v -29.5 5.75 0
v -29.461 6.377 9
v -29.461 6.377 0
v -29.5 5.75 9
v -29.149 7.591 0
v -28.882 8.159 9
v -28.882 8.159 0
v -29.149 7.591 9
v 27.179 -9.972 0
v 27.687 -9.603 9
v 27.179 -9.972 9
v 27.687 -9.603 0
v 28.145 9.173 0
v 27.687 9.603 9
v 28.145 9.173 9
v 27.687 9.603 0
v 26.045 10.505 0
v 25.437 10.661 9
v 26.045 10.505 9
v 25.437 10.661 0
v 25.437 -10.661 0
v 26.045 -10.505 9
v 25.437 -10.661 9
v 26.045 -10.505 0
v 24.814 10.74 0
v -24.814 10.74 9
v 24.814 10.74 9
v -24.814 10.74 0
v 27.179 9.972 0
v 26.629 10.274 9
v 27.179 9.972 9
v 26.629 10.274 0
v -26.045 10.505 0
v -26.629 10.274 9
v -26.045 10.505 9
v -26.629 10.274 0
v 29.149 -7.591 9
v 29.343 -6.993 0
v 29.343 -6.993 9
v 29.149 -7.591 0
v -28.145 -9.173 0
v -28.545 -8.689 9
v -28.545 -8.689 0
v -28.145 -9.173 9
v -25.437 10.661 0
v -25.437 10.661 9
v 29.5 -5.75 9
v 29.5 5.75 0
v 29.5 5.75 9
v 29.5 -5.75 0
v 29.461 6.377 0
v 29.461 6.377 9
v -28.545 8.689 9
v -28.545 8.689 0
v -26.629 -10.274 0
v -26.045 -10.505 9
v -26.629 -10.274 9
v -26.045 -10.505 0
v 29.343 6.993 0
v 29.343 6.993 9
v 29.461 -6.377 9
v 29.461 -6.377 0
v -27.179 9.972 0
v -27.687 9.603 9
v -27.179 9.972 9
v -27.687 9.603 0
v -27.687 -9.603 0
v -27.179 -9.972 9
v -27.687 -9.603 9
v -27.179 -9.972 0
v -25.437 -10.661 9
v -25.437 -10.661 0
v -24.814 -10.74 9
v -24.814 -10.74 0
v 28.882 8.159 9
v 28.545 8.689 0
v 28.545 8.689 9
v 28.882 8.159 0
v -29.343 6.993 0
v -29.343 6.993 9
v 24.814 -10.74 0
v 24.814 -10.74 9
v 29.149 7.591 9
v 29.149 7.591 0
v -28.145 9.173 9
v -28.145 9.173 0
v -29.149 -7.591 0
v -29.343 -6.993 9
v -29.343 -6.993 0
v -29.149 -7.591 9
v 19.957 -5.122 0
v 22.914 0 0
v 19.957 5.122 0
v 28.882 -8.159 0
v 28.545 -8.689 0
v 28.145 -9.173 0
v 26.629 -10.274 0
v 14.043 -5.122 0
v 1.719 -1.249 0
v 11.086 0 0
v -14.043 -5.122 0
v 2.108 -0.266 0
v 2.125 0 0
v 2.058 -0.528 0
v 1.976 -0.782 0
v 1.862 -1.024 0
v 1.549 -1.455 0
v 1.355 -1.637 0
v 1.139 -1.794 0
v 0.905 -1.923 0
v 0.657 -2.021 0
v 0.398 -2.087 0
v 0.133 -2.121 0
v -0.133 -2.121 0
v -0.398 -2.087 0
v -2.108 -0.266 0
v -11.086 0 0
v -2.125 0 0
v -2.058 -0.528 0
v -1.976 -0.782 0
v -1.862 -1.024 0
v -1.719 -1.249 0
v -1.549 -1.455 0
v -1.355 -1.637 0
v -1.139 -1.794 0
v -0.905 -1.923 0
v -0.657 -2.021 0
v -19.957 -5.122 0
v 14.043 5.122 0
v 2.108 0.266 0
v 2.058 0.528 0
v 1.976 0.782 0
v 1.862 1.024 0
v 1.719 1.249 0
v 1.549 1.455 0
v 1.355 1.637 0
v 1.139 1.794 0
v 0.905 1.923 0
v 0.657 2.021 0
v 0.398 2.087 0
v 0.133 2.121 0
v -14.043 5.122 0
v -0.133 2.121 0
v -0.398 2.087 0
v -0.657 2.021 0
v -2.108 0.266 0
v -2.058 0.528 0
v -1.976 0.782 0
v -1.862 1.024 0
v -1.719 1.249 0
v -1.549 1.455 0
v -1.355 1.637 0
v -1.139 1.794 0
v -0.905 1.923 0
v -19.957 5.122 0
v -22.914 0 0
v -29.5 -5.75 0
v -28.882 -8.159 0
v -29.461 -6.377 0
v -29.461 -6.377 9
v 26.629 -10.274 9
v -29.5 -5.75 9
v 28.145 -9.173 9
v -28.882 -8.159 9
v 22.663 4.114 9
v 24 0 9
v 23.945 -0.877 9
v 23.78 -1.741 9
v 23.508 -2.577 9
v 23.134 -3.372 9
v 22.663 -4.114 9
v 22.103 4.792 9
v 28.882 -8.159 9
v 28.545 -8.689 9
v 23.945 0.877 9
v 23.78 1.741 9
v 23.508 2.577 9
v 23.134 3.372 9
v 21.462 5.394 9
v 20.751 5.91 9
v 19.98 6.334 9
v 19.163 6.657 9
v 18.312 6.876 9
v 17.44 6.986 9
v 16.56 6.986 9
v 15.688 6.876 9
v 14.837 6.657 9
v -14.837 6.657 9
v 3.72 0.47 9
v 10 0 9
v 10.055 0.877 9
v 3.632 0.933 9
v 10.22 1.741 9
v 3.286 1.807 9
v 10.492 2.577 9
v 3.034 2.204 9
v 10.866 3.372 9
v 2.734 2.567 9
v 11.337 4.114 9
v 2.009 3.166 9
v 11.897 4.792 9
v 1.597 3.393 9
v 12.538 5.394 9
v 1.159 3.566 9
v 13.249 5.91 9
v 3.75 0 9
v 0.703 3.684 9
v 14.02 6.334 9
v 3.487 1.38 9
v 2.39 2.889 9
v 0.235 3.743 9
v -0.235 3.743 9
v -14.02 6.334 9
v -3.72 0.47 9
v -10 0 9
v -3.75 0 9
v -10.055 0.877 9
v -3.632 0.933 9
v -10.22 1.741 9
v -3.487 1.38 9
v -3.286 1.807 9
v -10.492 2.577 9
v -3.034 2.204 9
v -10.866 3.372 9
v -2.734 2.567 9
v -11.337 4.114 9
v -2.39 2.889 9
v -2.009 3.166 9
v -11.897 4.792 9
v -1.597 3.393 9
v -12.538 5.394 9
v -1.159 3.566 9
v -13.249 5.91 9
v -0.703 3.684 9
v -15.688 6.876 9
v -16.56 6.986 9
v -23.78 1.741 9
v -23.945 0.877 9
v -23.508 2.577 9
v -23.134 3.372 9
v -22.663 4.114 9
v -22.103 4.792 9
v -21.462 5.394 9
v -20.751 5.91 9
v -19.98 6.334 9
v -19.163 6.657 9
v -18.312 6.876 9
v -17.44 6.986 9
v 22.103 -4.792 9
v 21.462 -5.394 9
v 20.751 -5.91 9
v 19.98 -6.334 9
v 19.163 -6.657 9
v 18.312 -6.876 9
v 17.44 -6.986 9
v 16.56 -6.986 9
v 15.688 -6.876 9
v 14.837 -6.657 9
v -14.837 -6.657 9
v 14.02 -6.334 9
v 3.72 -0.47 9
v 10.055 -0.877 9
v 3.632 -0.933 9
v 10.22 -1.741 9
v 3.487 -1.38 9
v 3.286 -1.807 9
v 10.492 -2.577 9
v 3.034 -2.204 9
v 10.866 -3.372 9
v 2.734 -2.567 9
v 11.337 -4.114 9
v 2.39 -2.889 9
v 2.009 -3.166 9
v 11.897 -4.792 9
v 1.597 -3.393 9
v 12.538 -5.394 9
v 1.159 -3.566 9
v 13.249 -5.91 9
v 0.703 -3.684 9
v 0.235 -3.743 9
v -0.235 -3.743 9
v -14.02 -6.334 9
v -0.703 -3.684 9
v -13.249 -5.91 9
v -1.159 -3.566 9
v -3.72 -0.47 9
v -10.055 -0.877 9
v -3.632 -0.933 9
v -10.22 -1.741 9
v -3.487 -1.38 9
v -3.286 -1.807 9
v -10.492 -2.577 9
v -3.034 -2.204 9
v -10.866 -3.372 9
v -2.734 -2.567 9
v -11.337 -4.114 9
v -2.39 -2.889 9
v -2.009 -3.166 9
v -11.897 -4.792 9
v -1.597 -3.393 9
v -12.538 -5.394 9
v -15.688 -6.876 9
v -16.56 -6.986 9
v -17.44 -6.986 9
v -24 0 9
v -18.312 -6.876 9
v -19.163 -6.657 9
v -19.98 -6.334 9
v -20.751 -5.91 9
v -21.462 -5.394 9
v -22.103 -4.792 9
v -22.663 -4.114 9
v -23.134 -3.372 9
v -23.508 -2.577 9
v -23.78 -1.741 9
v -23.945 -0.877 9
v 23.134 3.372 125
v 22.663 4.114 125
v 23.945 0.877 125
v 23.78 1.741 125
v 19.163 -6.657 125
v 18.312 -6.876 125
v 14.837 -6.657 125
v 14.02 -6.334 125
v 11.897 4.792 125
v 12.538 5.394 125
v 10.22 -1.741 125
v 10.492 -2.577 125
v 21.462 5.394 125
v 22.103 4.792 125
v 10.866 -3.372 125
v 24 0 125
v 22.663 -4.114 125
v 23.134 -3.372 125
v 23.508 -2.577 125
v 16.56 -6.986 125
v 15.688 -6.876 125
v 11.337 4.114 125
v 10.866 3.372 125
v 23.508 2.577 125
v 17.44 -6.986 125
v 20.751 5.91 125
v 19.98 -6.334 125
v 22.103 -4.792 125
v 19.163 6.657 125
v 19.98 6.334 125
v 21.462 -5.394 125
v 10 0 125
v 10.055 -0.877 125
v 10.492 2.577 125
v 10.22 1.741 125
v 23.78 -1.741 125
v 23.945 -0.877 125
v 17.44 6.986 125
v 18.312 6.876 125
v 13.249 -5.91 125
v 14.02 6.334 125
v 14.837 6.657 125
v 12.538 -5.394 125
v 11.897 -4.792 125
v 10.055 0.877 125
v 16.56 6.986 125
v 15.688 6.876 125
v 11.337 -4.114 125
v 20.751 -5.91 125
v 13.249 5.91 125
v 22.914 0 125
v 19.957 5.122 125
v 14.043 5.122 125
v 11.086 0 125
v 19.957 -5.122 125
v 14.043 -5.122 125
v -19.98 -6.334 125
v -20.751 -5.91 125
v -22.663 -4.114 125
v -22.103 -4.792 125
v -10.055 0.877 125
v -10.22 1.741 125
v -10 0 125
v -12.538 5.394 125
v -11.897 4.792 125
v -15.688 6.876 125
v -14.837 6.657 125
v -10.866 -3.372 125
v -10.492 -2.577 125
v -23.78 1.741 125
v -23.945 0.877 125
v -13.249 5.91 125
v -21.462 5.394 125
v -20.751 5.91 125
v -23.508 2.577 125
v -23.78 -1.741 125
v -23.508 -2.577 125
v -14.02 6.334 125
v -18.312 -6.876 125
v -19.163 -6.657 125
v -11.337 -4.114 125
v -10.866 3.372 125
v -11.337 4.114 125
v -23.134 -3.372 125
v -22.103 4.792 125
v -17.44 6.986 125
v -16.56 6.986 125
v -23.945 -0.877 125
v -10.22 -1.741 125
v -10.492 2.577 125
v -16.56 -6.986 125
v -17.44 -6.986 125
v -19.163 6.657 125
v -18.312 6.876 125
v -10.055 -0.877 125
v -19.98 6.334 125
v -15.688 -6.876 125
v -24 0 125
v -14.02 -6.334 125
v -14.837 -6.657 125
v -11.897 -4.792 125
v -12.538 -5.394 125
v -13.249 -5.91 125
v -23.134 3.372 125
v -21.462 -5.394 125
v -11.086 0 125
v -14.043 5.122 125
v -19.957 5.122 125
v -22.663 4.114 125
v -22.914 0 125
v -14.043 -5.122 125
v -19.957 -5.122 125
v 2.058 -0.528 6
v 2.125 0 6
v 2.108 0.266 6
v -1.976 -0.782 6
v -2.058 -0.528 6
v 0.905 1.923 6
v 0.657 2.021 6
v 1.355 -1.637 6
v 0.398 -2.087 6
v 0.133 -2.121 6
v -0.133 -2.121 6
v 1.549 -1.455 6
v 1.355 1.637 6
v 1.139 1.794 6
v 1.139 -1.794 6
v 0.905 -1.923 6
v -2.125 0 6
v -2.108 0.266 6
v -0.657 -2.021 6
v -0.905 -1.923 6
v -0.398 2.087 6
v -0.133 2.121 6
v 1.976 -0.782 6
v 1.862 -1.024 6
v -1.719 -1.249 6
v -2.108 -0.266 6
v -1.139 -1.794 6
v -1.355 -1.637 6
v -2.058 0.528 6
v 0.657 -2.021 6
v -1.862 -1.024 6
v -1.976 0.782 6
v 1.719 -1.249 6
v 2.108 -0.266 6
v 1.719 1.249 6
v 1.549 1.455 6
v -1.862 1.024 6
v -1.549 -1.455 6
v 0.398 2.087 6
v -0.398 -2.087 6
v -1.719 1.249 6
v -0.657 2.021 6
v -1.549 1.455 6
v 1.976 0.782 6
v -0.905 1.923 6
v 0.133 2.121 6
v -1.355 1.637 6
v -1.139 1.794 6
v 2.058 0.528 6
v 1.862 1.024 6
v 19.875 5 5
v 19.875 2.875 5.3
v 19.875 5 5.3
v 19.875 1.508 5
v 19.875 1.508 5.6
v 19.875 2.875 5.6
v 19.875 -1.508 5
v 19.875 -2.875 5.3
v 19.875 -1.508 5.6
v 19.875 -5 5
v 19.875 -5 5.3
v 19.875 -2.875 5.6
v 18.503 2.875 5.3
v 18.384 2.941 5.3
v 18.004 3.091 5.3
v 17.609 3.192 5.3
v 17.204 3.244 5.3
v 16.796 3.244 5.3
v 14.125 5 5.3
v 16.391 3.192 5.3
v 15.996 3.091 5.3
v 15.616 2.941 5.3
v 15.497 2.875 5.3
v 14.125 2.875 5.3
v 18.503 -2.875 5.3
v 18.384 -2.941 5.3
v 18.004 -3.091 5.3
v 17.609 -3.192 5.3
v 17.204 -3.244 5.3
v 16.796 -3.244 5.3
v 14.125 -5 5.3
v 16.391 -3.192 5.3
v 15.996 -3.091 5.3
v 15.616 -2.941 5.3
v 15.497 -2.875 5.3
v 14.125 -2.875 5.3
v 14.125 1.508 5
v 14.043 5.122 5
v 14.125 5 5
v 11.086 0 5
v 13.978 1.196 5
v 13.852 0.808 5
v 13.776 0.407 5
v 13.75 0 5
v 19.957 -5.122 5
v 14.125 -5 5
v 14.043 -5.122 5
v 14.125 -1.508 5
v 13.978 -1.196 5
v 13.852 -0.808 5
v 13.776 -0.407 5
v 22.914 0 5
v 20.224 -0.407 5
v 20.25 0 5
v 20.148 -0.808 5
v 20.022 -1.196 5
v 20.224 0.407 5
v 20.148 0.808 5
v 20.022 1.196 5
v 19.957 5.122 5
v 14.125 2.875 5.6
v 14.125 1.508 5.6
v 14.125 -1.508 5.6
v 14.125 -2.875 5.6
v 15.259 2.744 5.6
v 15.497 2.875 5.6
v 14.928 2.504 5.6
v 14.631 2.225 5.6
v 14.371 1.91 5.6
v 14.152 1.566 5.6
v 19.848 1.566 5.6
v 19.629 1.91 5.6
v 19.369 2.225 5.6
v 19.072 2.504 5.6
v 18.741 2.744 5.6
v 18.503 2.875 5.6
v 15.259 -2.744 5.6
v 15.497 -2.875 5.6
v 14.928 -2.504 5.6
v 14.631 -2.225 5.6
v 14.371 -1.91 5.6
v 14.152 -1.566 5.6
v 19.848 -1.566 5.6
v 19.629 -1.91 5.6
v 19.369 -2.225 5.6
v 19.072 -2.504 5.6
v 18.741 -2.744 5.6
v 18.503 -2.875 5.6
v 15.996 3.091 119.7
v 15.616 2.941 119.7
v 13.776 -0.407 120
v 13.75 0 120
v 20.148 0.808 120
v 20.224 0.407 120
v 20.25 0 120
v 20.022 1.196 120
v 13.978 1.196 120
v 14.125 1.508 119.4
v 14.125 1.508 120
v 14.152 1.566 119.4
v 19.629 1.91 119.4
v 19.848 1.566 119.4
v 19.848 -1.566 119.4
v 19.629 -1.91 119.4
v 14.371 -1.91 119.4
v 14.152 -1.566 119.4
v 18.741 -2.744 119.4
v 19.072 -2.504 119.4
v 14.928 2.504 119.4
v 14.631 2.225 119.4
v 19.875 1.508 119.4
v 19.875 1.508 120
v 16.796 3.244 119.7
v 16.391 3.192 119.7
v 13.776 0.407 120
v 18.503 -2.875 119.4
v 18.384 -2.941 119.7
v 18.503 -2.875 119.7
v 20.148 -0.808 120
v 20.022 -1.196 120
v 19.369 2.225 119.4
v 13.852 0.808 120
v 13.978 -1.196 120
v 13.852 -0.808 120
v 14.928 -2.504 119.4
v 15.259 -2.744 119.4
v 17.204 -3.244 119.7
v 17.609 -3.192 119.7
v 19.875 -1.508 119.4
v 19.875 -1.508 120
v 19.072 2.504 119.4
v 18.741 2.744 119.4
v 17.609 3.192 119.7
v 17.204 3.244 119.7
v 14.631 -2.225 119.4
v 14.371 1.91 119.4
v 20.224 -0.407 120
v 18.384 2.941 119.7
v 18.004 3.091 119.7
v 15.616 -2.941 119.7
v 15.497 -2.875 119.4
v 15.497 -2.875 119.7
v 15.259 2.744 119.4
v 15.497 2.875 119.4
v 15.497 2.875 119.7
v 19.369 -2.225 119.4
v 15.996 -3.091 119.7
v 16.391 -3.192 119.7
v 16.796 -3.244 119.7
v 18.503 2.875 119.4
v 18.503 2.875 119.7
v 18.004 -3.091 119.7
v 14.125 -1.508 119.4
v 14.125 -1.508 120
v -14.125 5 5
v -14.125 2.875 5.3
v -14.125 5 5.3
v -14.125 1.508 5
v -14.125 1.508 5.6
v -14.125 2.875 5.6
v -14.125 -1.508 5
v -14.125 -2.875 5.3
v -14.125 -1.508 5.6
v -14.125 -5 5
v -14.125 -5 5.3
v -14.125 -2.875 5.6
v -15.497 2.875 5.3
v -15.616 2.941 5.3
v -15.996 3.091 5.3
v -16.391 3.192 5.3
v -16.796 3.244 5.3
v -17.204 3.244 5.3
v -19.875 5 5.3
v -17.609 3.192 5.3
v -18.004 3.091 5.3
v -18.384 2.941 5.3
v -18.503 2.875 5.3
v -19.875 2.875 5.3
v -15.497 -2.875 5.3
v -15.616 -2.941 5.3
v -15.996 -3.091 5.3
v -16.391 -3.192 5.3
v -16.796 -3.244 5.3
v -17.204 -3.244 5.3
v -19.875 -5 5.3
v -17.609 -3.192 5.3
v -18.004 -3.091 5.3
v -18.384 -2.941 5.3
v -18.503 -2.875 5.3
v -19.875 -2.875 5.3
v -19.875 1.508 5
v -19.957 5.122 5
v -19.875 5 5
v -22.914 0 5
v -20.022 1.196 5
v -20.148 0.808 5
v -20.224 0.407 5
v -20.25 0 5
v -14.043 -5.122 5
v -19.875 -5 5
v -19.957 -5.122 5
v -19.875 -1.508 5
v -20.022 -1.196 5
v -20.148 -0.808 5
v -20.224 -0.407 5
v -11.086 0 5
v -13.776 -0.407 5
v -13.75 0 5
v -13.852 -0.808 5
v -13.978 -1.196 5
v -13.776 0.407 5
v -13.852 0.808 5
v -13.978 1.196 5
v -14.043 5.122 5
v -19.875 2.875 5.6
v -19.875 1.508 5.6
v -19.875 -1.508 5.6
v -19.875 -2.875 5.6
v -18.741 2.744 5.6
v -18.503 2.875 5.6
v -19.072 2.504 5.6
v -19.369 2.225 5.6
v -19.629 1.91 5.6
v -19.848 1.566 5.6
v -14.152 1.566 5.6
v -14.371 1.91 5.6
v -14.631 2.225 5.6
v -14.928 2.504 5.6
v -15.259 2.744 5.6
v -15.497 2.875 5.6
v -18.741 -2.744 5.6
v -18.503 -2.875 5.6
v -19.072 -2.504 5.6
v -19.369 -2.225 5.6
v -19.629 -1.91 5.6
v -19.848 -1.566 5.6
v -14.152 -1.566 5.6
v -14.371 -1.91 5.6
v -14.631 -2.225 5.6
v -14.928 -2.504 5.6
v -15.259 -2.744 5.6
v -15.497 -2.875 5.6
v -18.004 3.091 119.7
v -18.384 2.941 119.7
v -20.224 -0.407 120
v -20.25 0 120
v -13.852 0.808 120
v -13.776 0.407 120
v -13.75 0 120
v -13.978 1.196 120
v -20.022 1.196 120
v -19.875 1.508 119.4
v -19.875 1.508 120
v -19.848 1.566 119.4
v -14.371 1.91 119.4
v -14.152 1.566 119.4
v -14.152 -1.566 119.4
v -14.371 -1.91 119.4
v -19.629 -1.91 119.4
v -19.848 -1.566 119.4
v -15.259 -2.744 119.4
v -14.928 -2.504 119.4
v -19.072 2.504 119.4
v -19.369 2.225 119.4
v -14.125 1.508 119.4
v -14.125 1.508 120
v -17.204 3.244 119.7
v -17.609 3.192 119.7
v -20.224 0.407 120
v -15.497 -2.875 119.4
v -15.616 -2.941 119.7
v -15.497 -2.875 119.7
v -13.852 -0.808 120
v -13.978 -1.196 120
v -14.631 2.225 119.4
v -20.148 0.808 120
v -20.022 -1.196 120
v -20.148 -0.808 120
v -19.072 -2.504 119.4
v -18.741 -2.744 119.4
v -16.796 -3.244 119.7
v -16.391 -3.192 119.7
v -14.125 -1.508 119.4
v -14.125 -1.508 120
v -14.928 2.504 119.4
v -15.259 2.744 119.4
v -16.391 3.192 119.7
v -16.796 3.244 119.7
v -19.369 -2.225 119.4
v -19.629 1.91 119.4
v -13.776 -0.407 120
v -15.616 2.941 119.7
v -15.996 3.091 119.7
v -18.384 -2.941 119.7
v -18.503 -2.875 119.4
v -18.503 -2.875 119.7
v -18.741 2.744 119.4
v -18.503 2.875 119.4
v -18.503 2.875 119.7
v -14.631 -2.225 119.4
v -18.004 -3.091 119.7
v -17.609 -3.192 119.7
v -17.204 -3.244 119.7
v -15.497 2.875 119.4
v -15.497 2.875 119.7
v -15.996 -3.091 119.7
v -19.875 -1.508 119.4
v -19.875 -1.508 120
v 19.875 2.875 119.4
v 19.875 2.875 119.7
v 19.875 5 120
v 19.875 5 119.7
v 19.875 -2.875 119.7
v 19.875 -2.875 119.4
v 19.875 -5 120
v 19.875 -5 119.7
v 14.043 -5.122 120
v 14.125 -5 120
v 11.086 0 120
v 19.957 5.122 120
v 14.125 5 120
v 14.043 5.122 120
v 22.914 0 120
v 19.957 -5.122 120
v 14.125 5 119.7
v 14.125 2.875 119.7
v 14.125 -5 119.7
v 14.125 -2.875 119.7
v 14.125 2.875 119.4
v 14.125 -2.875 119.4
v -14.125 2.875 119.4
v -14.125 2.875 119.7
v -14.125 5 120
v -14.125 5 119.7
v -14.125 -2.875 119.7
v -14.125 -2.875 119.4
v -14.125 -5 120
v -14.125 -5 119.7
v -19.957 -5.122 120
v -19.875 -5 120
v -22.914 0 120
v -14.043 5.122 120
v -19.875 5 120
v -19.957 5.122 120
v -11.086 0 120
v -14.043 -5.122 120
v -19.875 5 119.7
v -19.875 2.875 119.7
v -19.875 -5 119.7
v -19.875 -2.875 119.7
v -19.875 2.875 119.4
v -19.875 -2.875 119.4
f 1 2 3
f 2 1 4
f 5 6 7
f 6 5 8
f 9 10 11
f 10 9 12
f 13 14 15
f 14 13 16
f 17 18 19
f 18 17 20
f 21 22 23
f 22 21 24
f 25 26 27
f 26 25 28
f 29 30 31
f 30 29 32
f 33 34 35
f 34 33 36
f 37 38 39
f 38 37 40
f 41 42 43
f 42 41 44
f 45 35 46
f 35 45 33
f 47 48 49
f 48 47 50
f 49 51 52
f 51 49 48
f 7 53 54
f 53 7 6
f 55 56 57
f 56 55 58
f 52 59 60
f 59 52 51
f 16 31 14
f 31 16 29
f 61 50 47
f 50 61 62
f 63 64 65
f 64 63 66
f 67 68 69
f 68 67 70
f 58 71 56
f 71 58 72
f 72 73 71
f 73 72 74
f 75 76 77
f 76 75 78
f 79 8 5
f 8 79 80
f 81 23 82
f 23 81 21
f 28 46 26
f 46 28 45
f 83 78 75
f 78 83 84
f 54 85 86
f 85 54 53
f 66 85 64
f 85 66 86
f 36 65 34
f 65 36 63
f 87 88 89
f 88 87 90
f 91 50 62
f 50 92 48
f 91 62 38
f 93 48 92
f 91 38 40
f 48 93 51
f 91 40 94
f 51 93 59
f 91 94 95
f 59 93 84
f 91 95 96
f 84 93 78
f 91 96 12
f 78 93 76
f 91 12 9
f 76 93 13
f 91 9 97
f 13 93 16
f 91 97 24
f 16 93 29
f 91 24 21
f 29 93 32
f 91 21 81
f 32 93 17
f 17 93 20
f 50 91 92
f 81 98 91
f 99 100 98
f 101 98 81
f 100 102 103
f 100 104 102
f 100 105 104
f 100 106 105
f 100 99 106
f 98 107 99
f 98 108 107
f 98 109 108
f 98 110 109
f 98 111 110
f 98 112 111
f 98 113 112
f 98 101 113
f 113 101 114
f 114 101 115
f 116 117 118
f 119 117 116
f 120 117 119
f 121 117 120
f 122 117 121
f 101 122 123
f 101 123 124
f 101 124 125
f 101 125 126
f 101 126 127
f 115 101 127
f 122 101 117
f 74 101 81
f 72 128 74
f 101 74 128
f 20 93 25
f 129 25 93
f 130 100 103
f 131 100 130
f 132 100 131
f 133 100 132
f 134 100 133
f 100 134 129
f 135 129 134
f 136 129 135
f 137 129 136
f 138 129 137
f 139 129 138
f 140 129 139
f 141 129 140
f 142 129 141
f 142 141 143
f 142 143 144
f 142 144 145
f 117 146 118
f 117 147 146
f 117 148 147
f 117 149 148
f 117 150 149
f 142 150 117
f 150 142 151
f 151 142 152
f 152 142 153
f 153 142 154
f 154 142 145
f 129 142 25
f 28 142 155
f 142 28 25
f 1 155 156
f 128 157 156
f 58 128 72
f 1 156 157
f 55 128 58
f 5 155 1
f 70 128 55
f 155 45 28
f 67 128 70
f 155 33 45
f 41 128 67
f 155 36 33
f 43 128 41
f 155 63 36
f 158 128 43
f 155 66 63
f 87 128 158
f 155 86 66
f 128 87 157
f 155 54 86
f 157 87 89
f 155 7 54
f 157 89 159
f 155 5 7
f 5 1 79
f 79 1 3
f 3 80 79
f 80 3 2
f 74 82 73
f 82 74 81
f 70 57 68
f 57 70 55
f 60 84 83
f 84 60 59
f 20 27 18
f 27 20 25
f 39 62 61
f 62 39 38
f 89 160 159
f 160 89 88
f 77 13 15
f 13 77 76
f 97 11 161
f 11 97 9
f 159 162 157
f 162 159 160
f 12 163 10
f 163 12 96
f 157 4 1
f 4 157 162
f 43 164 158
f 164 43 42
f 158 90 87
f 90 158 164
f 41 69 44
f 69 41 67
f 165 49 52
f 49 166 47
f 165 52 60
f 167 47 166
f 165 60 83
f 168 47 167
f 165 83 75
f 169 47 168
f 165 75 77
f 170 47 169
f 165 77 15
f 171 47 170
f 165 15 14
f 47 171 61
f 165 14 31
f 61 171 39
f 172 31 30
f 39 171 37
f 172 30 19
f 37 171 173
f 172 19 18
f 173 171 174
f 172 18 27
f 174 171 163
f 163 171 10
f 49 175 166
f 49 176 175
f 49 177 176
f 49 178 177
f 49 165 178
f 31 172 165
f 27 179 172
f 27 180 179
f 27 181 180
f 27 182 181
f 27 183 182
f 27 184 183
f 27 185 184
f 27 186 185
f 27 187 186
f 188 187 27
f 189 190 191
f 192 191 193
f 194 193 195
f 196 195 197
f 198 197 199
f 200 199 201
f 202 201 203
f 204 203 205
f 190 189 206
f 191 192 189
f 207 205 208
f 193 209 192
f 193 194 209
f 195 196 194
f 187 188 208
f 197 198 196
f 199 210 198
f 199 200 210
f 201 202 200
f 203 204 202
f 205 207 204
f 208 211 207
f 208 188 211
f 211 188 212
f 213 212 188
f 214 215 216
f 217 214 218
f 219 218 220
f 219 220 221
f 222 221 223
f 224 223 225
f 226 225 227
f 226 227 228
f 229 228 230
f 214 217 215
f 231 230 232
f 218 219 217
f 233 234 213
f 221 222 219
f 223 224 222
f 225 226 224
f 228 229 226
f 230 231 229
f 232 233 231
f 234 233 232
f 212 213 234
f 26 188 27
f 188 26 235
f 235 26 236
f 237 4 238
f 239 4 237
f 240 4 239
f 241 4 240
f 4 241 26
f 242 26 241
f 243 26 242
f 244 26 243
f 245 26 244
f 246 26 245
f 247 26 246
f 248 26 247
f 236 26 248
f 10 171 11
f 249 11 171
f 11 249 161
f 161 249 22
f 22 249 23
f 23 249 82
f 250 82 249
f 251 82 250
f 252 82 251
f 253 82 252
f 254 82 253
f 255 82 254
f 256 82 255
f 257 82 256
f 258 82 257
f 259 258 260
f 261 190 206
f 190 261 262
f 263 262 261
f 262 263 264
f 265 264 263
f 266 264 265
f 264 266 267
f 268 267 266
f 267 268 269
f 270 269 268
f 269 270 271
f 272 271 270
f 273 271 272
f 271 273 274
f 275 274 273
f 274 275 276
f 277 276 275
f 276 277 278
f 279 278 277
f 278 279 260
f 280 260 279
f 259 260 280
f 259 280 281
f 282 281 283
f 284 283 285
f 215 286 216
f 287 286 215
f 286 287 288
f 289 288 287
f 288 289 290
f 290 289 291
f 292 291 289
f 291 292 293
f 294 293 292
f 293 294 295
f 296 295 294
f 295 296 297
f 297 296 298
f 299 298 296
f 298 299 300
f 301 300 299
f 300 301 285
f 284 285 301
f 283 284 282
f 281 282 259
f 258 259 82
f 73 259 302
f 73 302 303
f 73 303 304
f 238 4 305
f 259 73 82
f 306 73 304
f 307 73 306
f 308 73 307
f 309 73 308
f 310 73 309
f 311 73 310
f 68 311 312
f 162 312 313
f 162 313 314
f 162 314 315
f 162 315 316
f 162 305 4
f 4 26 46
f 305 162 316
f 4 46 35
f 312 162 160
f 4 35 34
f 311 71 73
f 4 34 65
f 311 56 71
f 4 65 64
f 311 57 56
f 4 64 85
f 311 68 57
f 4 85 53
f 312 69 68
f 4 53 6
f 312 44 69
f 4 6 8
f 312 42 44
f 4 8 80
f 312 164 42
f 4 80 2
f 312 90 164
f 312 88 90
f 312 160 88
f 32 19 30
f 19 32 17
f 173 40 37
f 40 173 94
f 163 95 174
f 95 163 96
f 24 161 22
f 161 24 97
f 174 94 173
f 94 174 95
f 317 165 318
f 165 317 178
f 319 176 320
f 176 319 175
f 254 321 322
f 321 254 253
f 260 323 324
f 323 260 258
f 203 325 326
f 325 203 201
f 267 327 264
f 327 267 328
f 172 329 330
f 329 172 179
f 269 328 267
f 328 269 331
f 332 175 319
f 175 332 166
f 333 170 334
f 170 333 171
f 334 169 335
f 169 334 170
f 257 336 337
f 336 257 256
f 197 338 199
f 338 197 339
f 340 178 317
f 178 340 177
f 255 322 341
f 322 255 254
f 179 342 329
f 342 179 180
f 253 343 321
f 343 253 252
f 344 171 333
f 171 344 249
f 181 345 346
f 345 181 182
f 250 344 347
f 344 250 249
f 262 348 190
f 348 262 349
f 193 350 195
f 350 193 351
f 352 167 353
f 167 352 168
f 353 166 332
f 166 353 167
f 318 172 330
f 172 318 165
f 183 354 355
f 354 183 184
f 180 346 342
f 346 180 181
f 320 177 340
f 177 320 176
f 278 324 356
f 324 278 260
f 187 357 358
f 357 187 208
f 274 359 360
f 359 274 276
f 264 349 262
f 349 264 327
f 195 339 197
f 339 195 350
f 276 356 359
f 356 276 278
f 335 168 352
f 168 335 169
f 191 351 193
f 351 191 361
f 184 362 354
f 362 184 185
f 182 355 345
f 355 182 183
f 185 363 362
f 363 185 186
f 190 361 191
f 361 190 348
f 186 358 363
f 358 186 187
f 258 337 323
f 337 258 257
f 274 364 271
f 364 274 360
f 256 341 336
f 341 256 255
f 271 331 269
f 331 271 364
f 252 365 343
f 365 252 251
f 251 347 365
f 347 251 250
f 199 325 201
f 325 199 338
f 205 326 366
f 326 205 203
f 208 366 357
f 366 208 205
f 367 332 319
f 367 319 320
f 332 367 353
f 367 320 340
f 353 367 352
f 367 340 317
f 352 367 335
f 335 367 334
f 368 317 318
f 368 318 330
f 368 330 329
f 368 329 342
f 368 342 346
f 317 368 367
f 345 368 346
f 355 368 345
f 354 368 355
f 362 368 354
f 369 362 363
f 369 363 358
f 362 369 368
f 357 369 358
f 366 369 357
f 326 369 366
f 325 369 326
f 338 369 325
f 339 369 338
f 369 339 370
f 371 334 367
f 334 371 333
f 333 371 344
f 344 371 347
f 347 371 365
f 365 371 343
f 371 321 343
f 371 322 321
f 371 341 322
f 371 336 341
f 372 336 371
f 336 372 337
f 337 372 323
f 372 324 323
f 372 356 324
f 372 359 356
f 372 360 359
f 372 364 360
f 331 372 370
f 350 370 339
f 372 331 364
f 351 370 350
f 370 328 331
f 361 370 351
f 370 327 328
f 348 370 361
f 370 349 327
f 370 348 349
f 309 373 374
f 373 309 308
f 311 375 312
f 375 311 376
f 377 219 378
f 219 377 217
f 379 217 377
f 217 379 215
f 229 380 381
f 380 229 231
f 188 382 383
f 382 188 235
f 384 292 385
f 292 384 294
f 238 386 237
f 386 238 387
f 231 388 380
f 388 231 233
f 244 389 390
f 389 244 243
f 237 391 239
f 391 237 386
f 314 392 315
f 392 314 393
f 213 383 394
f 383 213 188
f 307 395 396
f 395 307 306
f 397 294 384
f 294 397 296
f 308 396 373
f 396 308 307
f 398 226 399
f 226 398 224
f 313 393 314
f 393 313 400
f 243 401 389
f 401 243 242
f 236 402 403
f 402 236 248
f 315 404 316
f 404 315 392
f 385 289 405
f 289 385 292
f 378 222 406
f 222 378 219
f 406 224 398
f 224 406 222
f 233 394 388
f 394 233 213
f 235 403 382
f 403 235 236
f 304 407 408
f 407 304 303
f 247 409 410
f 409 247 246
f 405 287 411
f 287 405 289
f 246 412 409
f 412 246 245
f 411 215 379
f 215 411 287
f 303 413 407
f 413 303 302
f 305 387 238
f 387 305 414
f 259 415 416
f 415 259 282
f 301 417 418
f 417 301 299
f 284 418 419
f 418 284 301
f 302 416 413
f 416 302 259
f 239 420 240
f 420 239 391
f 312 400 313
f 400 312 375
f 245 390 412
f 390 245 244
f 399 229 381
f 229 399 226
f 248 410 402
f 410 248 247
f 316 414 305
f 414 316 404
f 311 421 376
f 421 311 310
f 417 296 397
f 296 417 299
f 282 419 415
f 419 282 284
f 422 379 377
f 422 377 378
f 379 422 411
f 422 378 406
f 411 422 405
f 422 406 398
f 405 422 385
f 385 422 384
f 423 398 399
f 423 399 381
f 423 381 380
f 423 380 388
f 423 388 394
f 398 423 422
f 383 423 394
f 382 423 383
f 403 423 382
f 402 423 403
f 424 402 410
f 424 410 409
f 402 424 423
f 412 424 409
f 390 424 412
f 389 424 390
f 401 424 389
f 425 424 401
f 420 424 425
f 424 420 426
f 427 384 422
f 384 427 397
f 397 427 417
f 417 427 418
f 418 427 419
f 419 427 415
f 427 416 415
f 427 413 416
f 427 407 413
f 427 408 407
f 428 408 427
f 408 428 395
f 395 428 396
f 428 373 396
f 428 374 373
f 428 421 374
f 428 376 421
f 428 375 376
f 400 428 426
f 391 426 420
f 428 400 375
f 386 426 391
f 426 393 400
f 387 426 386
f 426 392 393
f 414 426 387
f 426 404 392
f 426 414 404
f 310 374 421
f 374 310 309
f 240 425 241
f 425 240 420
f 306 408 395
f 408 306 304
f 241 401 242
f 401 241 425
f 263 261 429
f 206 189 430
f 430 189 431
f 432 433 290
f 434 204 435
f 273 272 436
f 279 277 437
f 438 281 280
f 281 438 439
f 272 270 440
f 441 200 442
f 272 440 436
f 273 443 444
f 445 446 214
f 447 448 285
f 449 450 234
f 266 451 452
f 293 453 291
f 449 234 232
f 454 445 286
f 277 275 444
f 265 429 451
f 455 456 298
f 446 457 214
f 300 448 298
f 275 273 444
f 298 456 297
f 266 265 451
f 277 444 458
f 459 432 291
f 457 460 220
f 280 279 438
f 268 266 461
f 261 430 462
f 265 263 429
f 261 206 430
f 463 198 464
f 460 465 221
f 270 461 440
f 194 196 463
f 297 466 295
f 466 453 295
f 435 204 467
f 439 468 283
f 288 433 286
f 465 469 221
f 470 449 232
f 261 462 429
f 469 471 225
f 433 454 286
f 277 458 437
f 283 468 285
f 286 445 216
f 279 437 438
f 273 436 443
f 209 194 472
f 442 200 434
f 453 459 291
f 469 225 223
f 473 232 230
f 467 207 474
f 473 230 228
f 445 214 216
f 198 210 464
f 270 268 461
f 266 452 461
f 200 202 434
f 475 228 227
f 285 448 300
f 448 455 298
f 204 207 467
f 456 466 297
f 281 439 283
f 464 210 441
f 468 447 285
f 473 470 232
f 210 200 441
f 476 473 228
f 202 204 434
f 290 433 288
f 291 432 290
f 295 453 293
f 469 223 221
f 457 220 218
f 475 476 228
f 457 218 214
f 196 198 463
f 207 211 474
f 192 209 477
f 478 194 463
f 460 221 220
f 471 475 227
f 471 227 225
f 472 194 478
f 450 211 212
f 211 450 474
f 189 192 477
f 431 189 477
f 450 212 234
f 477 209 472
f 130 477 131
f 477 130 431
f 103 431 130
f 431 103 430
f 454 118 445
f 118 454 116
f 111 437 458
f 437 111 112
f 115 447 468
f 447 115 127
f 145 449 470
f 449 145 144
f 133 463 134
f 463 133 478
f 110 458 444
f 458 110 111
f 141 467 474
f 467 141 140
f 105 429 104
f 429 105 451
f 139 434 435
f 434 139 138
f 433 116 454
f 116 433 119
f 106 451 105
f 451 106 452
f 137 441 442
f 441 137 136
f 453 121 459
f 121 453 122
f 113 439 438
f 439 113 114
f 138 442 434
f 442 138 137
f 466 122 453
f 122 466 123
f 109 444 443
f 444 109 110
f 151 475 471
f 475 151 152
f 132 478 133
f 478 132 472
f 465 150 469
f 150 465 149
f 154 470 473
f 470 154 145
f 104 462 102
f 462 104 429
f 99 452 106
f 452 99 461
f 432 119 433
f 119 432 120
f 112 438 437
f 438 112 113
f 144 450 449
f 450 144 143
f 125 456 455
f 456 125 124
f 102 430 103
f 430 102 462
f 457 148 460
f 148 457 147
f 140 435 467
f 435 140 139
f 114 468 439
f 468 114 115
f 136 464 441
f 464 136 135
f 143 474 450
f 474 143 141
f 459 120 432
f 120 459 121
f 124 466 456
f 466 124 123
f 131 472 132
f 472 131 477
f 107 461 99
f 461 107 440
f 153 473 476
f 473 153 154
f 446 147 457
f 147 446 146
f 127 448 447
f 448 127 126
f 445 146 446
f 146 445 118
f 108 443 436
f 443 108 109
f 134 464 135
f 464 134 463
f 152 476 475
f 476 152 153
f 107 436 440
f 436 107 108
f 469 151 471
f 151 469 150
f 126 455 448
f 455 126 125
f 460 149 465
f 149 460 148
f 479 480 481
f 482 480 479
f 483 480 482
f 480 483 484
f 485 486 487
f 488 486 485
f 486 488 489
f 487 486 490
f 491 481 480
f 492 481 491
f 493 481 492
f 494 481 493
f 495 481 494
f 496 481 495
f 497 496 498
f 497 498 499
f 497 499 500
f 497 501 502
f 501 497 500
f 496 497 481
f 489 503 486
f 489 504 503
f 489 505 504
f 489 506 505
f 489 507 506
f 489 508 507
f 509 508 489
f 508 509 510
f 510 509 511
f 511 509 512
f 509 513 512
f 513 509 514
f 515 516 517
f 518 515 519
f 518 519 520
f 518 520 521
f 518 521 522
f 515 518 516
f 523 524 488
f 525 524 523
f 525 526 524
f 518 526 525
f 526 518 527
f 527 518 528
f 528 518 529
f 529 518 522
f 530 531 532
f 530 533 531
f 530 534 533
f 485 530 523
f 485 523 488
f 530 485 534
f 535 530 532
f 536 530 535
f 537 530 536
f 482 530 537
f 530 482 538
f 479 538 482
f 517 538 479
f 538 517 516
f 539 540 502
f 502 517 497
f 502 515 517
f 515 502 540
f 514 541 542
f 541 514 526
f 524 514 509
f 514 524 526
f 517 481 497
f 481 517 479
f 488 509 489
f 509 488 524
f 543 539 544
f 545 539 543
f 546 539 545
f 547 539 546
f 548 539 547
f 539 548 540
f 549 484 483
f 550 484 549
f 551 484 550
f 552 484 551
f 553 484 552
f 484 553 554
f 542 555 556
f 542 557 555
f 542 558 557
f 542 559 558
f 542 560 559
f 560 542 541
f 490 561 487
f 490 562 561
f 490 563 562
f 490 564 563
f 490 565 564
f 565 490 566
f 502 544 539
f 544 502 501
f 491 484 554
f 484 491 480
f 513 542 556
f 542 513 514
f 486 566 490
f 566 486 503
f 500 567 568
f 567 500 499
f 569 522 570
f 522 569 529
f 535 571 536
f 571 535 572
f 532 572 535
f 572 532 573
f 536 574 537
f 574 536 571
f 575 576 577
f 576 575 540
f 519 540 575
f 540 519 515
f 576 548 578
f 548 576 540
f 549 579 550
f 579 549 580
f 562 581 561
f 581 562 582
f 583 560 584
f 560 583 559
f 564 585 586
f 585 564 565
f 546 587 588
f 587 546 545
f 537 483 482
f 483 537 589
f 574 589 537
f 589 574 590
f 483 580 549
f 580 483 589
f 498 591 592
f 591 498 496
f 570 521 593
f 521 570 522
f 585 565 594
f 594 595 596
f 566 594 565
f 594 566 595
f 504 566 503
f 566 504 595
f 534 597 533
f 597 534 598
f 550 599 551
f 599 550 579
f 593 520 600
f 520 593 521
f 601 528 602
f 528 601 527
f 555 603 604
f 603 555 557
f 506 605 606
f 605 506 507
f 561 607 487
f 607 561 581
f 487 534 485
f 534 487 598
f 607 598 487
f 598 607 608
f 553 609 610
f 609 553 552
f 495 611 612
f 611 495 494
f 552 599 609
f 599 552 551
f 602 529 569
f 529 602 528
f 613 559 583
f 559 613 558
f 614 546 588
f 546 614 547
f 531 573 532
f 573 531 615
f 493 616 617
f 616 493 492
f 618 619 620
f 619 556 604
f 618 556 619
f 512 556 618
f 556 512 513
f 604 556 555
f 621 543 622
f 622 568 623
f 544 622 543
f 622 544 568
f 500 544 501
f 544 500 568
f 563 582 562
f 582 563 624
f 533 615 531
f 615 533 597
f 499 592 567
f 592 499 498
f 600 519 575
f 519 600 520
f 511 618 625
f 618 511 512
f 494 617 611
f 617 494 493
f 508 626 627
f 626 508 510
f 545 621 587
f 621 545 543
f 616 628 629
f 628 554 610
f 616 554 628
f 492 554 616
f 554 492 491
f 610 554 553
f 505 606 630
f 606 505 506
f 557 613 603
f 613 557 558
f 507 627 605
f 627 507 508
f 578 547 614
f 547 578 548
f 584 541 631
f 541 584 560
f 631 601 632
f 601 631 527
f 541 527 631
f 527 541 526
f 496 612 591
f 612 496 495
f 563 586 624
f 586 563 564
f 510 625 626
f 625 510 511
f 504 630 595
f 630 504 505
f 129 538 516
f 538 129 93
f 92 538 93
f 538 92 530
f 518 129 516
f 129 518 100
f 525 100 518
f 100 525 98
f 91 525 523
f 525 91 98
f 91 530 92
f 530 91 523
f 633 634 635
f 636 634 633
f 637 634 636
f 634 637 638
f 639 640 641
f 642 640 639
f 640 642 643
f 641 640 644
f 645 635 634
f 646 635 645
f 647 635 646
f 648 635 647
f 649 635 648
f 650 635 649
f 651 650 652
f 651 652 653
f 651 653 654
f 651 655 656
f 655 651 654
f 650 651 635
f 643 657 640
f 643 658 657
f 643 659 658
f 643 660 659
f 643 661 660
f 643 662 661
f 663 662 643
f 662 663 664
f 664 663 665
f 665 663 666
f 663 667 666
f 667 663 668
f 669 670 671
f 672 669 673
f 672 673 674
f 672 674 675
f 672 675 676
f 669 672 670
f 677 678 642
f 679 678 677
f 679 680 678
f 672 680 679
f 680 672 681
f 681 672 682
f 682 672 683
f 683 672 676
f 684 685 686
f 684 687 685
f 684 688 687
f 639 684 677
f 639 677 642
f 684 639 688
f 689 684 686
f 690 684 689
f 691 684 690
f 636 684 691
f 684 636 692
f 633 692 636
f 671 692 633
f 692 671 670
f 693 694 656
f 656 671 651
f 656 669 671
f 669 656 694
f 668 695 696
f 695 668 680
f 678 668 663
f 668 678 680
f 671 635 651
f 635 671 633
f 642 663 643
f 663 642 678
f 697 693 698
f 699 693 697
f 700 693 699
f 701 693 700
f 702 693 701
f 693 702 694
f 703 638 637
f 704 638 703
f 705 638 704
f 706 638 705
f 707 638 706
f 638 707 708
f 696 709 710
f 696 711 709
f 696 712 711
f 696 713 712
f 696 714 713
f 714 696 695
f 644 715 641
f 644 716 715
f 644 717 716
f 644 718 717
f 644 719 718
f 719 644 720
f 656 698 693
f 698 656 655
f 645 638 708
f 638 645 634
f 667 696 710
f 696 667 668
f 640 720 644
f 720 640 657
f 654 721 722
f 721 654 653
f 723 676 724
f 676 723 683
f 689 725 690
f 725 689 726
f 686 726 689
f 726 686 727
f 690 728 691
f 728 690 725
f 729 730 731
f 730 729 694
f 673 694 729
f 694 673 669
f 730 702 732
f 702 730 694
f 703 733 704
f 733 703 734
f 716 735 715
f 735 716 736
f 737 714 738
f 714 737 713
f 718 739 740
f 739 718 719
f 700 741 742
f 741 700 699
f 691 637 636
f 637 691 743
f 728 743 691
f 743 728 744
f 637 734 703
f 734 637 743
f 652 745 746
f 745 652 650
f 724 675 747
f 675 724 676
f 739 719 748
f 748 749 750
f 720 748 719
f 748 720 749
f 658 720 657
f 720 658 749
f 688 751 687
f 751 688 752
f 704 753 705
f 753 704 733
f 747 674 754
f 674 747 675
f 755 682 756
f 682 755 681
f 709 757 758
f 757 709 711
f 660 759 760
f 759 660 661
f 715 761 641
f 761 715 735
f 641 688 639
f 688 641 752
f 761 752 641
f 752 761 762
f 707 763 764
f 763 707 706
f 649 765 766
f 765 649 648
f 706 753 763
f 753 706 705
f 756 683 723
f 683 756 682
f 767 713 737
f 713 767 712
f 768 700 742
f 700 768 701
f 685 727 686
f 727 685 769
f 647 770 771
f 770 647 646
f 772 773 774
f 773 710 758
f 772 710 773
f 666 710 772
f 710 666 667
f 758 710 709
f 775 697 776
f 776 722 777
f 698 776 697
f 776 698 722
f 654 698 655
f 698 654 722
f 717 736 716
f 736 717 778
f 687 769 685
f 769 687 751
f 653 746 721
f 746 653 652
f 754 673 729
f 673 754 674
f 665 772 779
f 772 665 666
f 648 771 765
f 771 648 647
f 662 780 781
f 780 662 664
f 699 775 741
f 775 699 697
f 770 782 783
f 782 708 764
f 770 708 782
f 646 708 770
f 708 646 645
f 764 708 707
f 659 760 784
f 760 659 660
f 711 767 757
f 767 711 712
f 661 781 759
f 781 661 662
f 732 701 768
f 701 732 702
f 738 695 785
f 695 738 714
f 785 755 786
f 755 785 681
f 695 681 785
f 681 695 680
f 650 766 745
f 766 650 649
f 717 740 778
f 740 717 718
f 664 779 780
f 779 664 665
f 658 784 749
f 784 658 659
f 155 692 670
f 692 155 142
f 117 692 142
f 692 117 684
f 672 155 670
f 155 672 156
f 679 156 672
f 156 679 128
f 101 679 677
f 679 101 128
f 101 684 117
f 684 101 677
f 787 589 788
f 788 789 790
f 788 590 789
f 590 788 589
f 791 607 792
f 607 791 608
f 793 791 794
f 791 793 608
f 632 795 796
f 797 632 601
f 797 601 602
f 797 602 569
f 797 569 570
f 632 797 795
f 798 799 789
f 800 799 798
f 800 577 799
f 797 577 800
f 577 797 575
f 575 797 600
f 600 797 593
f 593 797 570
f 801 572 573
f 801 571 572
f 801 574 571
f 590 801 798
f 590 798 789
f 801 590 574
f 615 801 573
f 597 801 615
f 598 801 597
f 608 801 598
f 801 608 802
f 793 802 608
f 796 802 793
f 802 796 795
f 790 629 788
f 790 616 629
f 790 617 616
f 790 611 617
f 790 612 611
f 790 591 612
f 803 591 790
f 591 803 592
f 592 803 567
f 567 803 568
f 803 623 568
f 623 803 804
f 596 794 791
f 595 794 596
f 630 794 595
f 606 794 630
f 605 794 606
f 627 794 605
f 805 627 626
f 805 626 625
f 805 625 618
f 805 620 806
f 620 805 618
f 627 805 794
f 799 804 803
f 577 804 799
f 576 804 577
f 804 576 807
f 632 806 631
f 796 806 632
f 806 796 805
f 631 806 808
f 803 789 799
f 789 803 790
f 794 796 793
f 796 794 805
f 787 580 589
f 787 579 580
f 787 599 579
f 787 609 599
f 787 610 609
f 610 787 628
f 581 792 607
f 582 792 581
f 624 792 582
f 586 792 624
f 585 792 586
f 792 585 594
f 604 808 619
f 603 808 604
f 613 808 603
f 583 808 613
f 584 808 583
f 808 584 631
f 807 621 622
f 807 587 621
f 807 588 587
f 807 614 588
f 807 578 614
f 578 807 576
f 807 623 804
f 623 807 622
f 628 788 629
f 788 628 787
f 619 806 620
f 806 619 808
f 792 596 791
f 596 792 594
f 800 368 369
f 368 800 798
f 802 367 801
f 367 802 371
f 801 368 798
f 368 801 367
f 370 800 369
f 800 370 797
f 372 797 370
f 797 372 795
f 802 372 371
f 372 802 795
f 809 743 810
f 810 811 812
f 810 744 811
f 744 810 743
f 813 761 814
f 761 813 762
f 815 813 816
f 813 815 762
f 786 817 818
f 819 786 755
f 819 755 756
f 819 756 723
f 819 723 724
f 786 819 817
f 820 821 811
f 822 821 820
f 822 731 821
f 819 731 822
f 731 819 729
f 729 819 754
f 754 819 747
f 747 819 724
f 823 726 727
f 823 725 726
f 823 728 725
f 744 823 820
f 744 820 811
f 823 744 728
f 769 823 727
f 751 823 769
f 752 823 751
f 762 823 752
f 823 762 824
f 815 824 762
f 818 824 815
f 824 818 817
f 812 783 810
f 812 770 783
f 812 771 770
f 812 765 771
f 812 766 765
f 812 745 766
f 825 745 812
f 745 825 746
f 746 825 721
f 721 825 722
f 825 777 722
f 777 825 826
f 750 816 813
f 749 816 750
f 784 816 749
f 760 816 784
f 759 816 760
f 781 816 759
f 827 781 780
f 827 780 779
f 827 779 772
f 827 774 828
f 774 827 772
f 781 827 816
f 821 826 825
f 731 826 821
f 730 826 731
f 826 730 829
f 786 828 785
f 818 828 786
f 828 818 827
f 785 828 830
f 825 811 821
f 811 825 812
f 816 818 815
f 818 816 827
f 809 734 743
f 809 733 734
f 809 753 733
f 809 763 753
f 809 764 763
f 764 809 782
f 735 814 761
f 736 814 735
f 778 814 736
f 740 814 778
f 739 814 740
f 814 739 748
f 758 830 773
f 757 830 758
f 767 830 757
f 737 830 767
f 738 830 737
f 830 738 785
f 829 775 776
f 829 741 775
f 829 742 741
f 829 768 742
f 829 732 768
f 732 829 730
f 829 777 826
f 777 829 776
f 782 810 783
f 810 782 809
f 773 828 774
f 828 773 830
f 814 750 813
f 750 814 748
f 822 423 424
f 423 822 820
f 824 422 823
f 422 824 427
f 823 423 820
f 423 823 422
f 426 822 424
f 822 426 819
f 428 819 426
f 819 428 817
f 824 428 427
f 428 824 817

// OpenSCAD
$fn = 50;


difference() {
	union() {
		hull() {
			translate(v = [-24.5000000000, 5.7500000000, 0]) {
				cylinder(h = 9, r = 5);
			}
			translate(v = [24.5000000000, 5.7500000000, 0]) {
				cylinder(h = 9, r = 5);
			}
			translate(v = [-24.5000000000, -5.7500000000, 0]) {
				cylinder(h = 9, r = 5);
			}
			translate(v = [24.5000000000, -5.7500000000, 0]) {
				cylinder(h = 9, r = 5);
			}
		}
		translate(v = [17.0000000000, 0, 0.0000000000]) {
			cylinder(h = 125, r = 7.0000000000);
		}
		translate(v = [-17.0000000000, 0, 0.0000000000]) {
			cylinder(h = 125, r = 7.0000000000);
		}
		translate(v = [17.0000000000, 0, 119.0000000000]) {
			cylinder(h = 6, r = 7.0000000000);
		}
		translate(v = [-17.0000000000, 0, 119.0000000000]) {
			cylinder(h = 6, r = 7.0000000000);
		}
	}
	union() {
		translate(v = [0, 0, 9]) {
			rotate(a = [0, 0, 0]) {
				difference() {
					union() {
						#translate(v = [0, 0, -120.0000000000]) {
							cylinder(h = 120, r = 2.0000000000);
						}
						#translate(v = [0, 0, -3]) {
							cylinder(h = 3, r1 = 2.1250000000, r2 = 3.7500000000);
						}
						#translate(v = [0, 0, -120.0000000000]) {
							cylinder(h = 120, r = 2.1250000000);
						}
						#translate(v = [0, 0, -120.0000000000]) {
							cylinder(h = 120, r = 2.0000000000);
						}
					}
					union();
				}
			}
		}
		translate(v = [17.0000000000, 0, 0]) {
			rotate(a = [0, 0, 0]) {
				difference() {
					union() {
						#translate(v = [-2.8750000000, -5.0000000000, -0.3000000000]) {
							cube(size = [5.7500000000, 10, 0.3000000000]);
						}
						#translate(v = [-2.8750000000, -2.8750000000, -0.6000000000]) {
							cube(size = [5.7500000000, 5.7500000000, 0.3000000000]);
						}
						#translate(v = [-2.8750000000, -5.0000000000, 5]) {
							cube(size = [5.7500000000, 10, 0.3000000000]);
						}
						#translate(v = [-2.8750000000, -2.8750000000, 5.3000000000]) {
							cube(size = [5.7500000000, 5.7500000000, 0.3000000000]);
						}
						#translate(v = [0, 0, -100.0000000000]) {
							cylinder(h = 200, r = 3.2500000000);
						}
						#linear_extrude(height = 5) {
							polygon(points = [[5.9142500000, 0.0000000000], [2.9571250000, 5.1218907443], [-2.9571250000, 5.1218907443], [-5.9142500000, 0.0000000000], [-2.9571250000, -5.1218907443], [2.9571250000, -5.1218907443]]);
						}
						#translate(v = [-2.8750000000, -5.0000000000, -0.3000000000]) {
							cube(size = [5.7500000000, 10, 0.3000000000]);
						}
						#translate(v = [-2.8750000000, -2.8750000000, -0.6000000000]) {
							cube(size = [5.7500000000, 5.7500000000, 0.3000000000]);
						}
						#translate(v = [-2.8750000000, -5.0000000000, 5]) {
							cube(size = [5.7500000000, 10, 0.3000000000]);
						}
						#translate(v = [-2.8750000000, -2.8750000000, 5.3000000000]) {
							cube(size = [5.7500000000, 5.7500000000, 0.3000000000]);
						}
						#translate(v = [0, 0, -100.0000000000]) {
							cylinder(h = 200, r = 3.2500000000);
						}
						#translate(v = [-2.8750000000, -5.0000000000, -0.3000000000]) {
							cube(size = [5.7500000000, 10, 0.3000000000]);
						}
						#translate(v = [-2.8750000000, -2.8750000000, -0.6000000000]) {
							cube(size = [5.7500000000, 5.7500000000, 0.3000000000]);
						}
						#translate(v = [-2.8750000000, -5.0000000000, 5]) {
							cube(size = [5.7500000000, 10, 0.3000000000]);
						}
						#translate(v = [-2.8750000000, -2.8750000000, 5.3000000000]) {
							cube(size = [5.7500000000, 5.7500000000, 0.3000000000]);
						}
						#translate(v = [0, 0, -100.0000000000]) {
							cylinder(h = 200, r = 3.2500000000);
						}
					}
					union();
				}
			}
		}
		translate(v = [-17.0000000000, 0, 0]) {
			rotate(a = [0, 0, 0]) {
				difference() {
					union() {
						#translate(v = [-2.8750000000, -5.0000000000, -0.3000000000]) {
							cube(size = [5.7500000000, 10, 0.3000000000]);
						}
						#translate(v = [-2.8750000000, -2.8750000000, -0.6000000000]) {
							cube(size = [5.7500000000, 5.7500000000, 0.3000000000]);
						}
						#translate(v = [-2.8750000000, -5.0000000000, 5]) {
							cube(size = [5.7500000000, 10, 0.3000000000]);
						}
						#translate(v = [-2.8750000000, -2.8750000000, 5.3000000000]) {
							cube(size = [5.7500000000, 5.7500000000, 0.3000000000]);
						}
						#translate(v = [0, 0, -100.0000000000]) {
							cylinder(h = 200, r = 3.2500000000);
						}
						#linear_extrude(height = 5) {
							polygon(points = [[5.9142500000, 0.0000000000], [2.9571250000, 5.1218907443], [-2.9571250000, 5.1218907443], [-5.9142500000, 0.0000000000], [-2.9571250000, -5.1218907443], [2.9571250000, -5.1218907443]]);
						}
						#translate(v = [-2.8750000000, -5.0000000000, -0.3000000000]) {
							cube(size = [5.7500000000, 10, 0.3000000000]);
						}
						#translate(v = [-2.8750000000, -2.8750000000, -0.6000000000]) {
							cube(size = [5.7500000000, 5.7500000000, 0.3000000000]);
						}
						#translate(v = [-2.8750000000, -5.0000000000, 5]) {
							cube(size = [5.7500000000, 10, 0.3000000000]);
						}
						#translate(v = [-2.8750000000, -2.8750000000, 5.3000000000]) {
							cube(size = [5.7500000000, 5.7500000000, 0.3000000000]);
						}
						#translate(v = [0, 0, -100.0000000000]) {
							cylinder(h = 200, r = 3.2500000000);
						}
						#translate(v = [-2.8750000000, -5.0000000000, -0.3000000000]) {
							cube(size = [5.7500000000, 10, 0.3000000000]);
						}
						#translate(v = [-2.8750000000, -2.8750000000, -0.6000000000]) {
							cube(size = [5.7500000000, 5.7500000000, 0.3000000000]);
						}
						#translate(v = [-2.8750000000, -5.0000000000, 5]) {
							cube(size = [5.7500000000, 10, 0.3000000000]);
						}
						#translate(v = [-2.8750000000, -2.8750000000, 5.3000000000]) {
							cube(size = [5.7500000000, 5.7500000000, 0.3000000000]);
						}
						#translate(v = [0, 0, -100.0000000000]) {
							cylinder(h = 200, r = 3.2500000000);
						}
					}
					union();
				}
			}
		}
		translate(v = [17.0000000000, 0, 125]) {
			rotate(a = [0, 0, 0]) {
				difference() {
					union() {
						#translate(v = [-2.8750000000, -5.0000000000, -5.3000000000]) {
							cube(size = [5.7500000000, 10, 0.3000000000]);
						}
						#translate(v = [-2.8750000000, -2.8750000000, -5.6000000000]) {
							cube(size = [5.7500000000, 5.7500000000, 0.3000000000]);
						}
						#translate(v = [-2.8750000000, -5.0000000000, 0]) {
							cube(size = [5.7500000000, 10, 0.3000000000]);
						}
						#translate(v = [-2.8750000000, -2.8750000000, 0.3000000000]) {
							cube(size = [5.7500000000, 5.7500000000, 0.3000000000]);
						}
						#translate(v = [0, 0, -100.0000000000]) {
							cylinder(h = 200, r = 3.2500000000);
						}
						translate(v = [0, 0, -5]) {
							#linear_extrude(height = 5) {
								polygon(points = [[5.9142500000, 0.0000000000], [2.9571250000, 5.1218907443], [-2.9571250000, 5.1218907443], [-5.9142500000, 0.0000000000], [-2.9571250000, -5.1218907443], [2.9571250000, -5.1218907443]]);
							}
						}
						#translate(v = [-2.8750000000, -5.0000000000, -5.3000000000]) {
							cube(size = [5.7500000000, 10, 0.3000000000]);
						}
						#translate(v = [-2.8750000000, -2.8750000000, -5.6000000000]) {
							cube(size = [5.7500000000, 5.7500000000, 0.3000000000]);
						}
						#translate(v = [-2.8750000000, -5.0000000000, 0]) {
							cube(size = [5.7500000000, 10, 0.3000000000]);
						}
						#translate(v = [-2.8750000000, -2.8750000000, 0.3000000000]) {
							cube(size = [5.7500000000, 5.7500000000, 0.3000000000]);
						}
						#translate(v = [0, 0, -100.0000000000]) {
							cylinder(h = 200, r = 3.2500000000);
						}
						#translate(v = [-2.8750000000, -5.0000000000, -5.3000000000]) {
							cube(size = [5.7500000000, 10, 0.3000000000]);
						}
						#translate(v = [-2.8750000000, -2.8750000000, -5.6000000000]) {
							cube(size = [5.7500000000, 5.7500000000, 0.3000000000]);
						}
						#translate(v = [-2.8750000000, -5.0000000000, 0]) {
							cube(size = [5.7500000000, 10, 0.3000000000]);
						}
						#translate(v = [-2.8750000000, -2.8750000000, 0.3000000000]) {
							cube(size = [5.7500000000, 5.7500000000, 0.3000000000]);
						}
						#translate(v = [0, 0, -100.0000000000]) {
							cylinder(h = 200, r = 3.2500000000);
						}
					}
					union();
				}
			}
		}
		translate(v = [-17.0000000000, 0, 125]) {
			rotate(a = [0, 0, 0]) {
				difference() {
					union() {
						#translate(v = [-2.8750000000, -5.0000000000, -5.3000000000]) {
							cube(size = [5.7500000000, 10, 0.3000000000]);
						}
						#translate(v = [-2.8750000000, -2.8750000000, -5.6000000000]) {
							cube(size = [5.7500000000, 5.7500000000, 0.3000000000]);
						}
						#translate(v = [-2.8750000000, -5.0000000000, 0]) {
							cube(size = [5.7500000000, 10, 0.3000000000]);
						}
						#translate(v = [-2.8750000000, -2.8750000000, 0.3000000000]) {
							cube(size = [5.7500000000, 5.7500000000, 0.3000000000]);
						}
						#translate(v = [0, 0, -100.0000000000]) {
							cylinder(h = 200, r = 3.2500000000);
						}
						translate(v = [0, 0, -5]) {
							#linear_extrude(height = 5) {
								polygon(points = [[5.9142500000, 0.0000000000], [2.9571250000, 5.1218907443], [-2.9571250000, 5.1218907443], [-5.9142500000, 0.0000000000], [-2.9571250000, -5.1218907443], [2.9571250000, -5.1218907443]]);
							}
						}
						#translate(v = [-2.8750000000, -5.0000000000, -5.3000000000]) {
							cube(size = [5.7500000000, 10, 0.3000000000]);
						}
						#translate(v = [-2.8750000000, -2.8750000000, -5.6000000000]) {
							cube(size = [5.7500000000, 5.7500000000, 0.3000000000]);
						}
						#translate(v = [-2.8750000000, -5.0000000000, 0]) {
							cube(size = [5.7500000000, 10, 0.3000000000]);
						}
						#translate(v = [-2.8750000000, -2.8750000000, 0.3000000000]) {
							cube(size = [5.7500000000, 5.7500000000, 0.3000000000]);
						}
						#translate(v = [0, 0, -100.0000000000]) {
							cylinder(h = 200, r = 3.2500000000);
						}
						#translate(v = [-2.8750000000, -5.0000000000, -5.3000000000]) {
							cube(size = [5.7500000000, 10, 0.3000000000]);
						}
						#translate(v = [-2.8750000000, -2.8750000000, -5.6000000000]) {
							cube(size = [5.7500000000, 5.7500000000, 0.3000000000]);
						}
						#translate(v = [-2.8750000000, -5.0000000000, 0]) {
							cube(size = [5.7500000000, 10, 0.3000000000]);
						}
						#translate(v = [-2.8750000000, -2.8750000000, 0.3000000000]) {
							cube(size = [5.7500000000, 5.7500000000, 0.3000000000]);
						}
						#translate(v = [0, 0, -100.0000000000]) {
							cylinder(h = 200, r = 3.2500000000);
						}
					}
					union();
				}
			}
		}
	}
}
